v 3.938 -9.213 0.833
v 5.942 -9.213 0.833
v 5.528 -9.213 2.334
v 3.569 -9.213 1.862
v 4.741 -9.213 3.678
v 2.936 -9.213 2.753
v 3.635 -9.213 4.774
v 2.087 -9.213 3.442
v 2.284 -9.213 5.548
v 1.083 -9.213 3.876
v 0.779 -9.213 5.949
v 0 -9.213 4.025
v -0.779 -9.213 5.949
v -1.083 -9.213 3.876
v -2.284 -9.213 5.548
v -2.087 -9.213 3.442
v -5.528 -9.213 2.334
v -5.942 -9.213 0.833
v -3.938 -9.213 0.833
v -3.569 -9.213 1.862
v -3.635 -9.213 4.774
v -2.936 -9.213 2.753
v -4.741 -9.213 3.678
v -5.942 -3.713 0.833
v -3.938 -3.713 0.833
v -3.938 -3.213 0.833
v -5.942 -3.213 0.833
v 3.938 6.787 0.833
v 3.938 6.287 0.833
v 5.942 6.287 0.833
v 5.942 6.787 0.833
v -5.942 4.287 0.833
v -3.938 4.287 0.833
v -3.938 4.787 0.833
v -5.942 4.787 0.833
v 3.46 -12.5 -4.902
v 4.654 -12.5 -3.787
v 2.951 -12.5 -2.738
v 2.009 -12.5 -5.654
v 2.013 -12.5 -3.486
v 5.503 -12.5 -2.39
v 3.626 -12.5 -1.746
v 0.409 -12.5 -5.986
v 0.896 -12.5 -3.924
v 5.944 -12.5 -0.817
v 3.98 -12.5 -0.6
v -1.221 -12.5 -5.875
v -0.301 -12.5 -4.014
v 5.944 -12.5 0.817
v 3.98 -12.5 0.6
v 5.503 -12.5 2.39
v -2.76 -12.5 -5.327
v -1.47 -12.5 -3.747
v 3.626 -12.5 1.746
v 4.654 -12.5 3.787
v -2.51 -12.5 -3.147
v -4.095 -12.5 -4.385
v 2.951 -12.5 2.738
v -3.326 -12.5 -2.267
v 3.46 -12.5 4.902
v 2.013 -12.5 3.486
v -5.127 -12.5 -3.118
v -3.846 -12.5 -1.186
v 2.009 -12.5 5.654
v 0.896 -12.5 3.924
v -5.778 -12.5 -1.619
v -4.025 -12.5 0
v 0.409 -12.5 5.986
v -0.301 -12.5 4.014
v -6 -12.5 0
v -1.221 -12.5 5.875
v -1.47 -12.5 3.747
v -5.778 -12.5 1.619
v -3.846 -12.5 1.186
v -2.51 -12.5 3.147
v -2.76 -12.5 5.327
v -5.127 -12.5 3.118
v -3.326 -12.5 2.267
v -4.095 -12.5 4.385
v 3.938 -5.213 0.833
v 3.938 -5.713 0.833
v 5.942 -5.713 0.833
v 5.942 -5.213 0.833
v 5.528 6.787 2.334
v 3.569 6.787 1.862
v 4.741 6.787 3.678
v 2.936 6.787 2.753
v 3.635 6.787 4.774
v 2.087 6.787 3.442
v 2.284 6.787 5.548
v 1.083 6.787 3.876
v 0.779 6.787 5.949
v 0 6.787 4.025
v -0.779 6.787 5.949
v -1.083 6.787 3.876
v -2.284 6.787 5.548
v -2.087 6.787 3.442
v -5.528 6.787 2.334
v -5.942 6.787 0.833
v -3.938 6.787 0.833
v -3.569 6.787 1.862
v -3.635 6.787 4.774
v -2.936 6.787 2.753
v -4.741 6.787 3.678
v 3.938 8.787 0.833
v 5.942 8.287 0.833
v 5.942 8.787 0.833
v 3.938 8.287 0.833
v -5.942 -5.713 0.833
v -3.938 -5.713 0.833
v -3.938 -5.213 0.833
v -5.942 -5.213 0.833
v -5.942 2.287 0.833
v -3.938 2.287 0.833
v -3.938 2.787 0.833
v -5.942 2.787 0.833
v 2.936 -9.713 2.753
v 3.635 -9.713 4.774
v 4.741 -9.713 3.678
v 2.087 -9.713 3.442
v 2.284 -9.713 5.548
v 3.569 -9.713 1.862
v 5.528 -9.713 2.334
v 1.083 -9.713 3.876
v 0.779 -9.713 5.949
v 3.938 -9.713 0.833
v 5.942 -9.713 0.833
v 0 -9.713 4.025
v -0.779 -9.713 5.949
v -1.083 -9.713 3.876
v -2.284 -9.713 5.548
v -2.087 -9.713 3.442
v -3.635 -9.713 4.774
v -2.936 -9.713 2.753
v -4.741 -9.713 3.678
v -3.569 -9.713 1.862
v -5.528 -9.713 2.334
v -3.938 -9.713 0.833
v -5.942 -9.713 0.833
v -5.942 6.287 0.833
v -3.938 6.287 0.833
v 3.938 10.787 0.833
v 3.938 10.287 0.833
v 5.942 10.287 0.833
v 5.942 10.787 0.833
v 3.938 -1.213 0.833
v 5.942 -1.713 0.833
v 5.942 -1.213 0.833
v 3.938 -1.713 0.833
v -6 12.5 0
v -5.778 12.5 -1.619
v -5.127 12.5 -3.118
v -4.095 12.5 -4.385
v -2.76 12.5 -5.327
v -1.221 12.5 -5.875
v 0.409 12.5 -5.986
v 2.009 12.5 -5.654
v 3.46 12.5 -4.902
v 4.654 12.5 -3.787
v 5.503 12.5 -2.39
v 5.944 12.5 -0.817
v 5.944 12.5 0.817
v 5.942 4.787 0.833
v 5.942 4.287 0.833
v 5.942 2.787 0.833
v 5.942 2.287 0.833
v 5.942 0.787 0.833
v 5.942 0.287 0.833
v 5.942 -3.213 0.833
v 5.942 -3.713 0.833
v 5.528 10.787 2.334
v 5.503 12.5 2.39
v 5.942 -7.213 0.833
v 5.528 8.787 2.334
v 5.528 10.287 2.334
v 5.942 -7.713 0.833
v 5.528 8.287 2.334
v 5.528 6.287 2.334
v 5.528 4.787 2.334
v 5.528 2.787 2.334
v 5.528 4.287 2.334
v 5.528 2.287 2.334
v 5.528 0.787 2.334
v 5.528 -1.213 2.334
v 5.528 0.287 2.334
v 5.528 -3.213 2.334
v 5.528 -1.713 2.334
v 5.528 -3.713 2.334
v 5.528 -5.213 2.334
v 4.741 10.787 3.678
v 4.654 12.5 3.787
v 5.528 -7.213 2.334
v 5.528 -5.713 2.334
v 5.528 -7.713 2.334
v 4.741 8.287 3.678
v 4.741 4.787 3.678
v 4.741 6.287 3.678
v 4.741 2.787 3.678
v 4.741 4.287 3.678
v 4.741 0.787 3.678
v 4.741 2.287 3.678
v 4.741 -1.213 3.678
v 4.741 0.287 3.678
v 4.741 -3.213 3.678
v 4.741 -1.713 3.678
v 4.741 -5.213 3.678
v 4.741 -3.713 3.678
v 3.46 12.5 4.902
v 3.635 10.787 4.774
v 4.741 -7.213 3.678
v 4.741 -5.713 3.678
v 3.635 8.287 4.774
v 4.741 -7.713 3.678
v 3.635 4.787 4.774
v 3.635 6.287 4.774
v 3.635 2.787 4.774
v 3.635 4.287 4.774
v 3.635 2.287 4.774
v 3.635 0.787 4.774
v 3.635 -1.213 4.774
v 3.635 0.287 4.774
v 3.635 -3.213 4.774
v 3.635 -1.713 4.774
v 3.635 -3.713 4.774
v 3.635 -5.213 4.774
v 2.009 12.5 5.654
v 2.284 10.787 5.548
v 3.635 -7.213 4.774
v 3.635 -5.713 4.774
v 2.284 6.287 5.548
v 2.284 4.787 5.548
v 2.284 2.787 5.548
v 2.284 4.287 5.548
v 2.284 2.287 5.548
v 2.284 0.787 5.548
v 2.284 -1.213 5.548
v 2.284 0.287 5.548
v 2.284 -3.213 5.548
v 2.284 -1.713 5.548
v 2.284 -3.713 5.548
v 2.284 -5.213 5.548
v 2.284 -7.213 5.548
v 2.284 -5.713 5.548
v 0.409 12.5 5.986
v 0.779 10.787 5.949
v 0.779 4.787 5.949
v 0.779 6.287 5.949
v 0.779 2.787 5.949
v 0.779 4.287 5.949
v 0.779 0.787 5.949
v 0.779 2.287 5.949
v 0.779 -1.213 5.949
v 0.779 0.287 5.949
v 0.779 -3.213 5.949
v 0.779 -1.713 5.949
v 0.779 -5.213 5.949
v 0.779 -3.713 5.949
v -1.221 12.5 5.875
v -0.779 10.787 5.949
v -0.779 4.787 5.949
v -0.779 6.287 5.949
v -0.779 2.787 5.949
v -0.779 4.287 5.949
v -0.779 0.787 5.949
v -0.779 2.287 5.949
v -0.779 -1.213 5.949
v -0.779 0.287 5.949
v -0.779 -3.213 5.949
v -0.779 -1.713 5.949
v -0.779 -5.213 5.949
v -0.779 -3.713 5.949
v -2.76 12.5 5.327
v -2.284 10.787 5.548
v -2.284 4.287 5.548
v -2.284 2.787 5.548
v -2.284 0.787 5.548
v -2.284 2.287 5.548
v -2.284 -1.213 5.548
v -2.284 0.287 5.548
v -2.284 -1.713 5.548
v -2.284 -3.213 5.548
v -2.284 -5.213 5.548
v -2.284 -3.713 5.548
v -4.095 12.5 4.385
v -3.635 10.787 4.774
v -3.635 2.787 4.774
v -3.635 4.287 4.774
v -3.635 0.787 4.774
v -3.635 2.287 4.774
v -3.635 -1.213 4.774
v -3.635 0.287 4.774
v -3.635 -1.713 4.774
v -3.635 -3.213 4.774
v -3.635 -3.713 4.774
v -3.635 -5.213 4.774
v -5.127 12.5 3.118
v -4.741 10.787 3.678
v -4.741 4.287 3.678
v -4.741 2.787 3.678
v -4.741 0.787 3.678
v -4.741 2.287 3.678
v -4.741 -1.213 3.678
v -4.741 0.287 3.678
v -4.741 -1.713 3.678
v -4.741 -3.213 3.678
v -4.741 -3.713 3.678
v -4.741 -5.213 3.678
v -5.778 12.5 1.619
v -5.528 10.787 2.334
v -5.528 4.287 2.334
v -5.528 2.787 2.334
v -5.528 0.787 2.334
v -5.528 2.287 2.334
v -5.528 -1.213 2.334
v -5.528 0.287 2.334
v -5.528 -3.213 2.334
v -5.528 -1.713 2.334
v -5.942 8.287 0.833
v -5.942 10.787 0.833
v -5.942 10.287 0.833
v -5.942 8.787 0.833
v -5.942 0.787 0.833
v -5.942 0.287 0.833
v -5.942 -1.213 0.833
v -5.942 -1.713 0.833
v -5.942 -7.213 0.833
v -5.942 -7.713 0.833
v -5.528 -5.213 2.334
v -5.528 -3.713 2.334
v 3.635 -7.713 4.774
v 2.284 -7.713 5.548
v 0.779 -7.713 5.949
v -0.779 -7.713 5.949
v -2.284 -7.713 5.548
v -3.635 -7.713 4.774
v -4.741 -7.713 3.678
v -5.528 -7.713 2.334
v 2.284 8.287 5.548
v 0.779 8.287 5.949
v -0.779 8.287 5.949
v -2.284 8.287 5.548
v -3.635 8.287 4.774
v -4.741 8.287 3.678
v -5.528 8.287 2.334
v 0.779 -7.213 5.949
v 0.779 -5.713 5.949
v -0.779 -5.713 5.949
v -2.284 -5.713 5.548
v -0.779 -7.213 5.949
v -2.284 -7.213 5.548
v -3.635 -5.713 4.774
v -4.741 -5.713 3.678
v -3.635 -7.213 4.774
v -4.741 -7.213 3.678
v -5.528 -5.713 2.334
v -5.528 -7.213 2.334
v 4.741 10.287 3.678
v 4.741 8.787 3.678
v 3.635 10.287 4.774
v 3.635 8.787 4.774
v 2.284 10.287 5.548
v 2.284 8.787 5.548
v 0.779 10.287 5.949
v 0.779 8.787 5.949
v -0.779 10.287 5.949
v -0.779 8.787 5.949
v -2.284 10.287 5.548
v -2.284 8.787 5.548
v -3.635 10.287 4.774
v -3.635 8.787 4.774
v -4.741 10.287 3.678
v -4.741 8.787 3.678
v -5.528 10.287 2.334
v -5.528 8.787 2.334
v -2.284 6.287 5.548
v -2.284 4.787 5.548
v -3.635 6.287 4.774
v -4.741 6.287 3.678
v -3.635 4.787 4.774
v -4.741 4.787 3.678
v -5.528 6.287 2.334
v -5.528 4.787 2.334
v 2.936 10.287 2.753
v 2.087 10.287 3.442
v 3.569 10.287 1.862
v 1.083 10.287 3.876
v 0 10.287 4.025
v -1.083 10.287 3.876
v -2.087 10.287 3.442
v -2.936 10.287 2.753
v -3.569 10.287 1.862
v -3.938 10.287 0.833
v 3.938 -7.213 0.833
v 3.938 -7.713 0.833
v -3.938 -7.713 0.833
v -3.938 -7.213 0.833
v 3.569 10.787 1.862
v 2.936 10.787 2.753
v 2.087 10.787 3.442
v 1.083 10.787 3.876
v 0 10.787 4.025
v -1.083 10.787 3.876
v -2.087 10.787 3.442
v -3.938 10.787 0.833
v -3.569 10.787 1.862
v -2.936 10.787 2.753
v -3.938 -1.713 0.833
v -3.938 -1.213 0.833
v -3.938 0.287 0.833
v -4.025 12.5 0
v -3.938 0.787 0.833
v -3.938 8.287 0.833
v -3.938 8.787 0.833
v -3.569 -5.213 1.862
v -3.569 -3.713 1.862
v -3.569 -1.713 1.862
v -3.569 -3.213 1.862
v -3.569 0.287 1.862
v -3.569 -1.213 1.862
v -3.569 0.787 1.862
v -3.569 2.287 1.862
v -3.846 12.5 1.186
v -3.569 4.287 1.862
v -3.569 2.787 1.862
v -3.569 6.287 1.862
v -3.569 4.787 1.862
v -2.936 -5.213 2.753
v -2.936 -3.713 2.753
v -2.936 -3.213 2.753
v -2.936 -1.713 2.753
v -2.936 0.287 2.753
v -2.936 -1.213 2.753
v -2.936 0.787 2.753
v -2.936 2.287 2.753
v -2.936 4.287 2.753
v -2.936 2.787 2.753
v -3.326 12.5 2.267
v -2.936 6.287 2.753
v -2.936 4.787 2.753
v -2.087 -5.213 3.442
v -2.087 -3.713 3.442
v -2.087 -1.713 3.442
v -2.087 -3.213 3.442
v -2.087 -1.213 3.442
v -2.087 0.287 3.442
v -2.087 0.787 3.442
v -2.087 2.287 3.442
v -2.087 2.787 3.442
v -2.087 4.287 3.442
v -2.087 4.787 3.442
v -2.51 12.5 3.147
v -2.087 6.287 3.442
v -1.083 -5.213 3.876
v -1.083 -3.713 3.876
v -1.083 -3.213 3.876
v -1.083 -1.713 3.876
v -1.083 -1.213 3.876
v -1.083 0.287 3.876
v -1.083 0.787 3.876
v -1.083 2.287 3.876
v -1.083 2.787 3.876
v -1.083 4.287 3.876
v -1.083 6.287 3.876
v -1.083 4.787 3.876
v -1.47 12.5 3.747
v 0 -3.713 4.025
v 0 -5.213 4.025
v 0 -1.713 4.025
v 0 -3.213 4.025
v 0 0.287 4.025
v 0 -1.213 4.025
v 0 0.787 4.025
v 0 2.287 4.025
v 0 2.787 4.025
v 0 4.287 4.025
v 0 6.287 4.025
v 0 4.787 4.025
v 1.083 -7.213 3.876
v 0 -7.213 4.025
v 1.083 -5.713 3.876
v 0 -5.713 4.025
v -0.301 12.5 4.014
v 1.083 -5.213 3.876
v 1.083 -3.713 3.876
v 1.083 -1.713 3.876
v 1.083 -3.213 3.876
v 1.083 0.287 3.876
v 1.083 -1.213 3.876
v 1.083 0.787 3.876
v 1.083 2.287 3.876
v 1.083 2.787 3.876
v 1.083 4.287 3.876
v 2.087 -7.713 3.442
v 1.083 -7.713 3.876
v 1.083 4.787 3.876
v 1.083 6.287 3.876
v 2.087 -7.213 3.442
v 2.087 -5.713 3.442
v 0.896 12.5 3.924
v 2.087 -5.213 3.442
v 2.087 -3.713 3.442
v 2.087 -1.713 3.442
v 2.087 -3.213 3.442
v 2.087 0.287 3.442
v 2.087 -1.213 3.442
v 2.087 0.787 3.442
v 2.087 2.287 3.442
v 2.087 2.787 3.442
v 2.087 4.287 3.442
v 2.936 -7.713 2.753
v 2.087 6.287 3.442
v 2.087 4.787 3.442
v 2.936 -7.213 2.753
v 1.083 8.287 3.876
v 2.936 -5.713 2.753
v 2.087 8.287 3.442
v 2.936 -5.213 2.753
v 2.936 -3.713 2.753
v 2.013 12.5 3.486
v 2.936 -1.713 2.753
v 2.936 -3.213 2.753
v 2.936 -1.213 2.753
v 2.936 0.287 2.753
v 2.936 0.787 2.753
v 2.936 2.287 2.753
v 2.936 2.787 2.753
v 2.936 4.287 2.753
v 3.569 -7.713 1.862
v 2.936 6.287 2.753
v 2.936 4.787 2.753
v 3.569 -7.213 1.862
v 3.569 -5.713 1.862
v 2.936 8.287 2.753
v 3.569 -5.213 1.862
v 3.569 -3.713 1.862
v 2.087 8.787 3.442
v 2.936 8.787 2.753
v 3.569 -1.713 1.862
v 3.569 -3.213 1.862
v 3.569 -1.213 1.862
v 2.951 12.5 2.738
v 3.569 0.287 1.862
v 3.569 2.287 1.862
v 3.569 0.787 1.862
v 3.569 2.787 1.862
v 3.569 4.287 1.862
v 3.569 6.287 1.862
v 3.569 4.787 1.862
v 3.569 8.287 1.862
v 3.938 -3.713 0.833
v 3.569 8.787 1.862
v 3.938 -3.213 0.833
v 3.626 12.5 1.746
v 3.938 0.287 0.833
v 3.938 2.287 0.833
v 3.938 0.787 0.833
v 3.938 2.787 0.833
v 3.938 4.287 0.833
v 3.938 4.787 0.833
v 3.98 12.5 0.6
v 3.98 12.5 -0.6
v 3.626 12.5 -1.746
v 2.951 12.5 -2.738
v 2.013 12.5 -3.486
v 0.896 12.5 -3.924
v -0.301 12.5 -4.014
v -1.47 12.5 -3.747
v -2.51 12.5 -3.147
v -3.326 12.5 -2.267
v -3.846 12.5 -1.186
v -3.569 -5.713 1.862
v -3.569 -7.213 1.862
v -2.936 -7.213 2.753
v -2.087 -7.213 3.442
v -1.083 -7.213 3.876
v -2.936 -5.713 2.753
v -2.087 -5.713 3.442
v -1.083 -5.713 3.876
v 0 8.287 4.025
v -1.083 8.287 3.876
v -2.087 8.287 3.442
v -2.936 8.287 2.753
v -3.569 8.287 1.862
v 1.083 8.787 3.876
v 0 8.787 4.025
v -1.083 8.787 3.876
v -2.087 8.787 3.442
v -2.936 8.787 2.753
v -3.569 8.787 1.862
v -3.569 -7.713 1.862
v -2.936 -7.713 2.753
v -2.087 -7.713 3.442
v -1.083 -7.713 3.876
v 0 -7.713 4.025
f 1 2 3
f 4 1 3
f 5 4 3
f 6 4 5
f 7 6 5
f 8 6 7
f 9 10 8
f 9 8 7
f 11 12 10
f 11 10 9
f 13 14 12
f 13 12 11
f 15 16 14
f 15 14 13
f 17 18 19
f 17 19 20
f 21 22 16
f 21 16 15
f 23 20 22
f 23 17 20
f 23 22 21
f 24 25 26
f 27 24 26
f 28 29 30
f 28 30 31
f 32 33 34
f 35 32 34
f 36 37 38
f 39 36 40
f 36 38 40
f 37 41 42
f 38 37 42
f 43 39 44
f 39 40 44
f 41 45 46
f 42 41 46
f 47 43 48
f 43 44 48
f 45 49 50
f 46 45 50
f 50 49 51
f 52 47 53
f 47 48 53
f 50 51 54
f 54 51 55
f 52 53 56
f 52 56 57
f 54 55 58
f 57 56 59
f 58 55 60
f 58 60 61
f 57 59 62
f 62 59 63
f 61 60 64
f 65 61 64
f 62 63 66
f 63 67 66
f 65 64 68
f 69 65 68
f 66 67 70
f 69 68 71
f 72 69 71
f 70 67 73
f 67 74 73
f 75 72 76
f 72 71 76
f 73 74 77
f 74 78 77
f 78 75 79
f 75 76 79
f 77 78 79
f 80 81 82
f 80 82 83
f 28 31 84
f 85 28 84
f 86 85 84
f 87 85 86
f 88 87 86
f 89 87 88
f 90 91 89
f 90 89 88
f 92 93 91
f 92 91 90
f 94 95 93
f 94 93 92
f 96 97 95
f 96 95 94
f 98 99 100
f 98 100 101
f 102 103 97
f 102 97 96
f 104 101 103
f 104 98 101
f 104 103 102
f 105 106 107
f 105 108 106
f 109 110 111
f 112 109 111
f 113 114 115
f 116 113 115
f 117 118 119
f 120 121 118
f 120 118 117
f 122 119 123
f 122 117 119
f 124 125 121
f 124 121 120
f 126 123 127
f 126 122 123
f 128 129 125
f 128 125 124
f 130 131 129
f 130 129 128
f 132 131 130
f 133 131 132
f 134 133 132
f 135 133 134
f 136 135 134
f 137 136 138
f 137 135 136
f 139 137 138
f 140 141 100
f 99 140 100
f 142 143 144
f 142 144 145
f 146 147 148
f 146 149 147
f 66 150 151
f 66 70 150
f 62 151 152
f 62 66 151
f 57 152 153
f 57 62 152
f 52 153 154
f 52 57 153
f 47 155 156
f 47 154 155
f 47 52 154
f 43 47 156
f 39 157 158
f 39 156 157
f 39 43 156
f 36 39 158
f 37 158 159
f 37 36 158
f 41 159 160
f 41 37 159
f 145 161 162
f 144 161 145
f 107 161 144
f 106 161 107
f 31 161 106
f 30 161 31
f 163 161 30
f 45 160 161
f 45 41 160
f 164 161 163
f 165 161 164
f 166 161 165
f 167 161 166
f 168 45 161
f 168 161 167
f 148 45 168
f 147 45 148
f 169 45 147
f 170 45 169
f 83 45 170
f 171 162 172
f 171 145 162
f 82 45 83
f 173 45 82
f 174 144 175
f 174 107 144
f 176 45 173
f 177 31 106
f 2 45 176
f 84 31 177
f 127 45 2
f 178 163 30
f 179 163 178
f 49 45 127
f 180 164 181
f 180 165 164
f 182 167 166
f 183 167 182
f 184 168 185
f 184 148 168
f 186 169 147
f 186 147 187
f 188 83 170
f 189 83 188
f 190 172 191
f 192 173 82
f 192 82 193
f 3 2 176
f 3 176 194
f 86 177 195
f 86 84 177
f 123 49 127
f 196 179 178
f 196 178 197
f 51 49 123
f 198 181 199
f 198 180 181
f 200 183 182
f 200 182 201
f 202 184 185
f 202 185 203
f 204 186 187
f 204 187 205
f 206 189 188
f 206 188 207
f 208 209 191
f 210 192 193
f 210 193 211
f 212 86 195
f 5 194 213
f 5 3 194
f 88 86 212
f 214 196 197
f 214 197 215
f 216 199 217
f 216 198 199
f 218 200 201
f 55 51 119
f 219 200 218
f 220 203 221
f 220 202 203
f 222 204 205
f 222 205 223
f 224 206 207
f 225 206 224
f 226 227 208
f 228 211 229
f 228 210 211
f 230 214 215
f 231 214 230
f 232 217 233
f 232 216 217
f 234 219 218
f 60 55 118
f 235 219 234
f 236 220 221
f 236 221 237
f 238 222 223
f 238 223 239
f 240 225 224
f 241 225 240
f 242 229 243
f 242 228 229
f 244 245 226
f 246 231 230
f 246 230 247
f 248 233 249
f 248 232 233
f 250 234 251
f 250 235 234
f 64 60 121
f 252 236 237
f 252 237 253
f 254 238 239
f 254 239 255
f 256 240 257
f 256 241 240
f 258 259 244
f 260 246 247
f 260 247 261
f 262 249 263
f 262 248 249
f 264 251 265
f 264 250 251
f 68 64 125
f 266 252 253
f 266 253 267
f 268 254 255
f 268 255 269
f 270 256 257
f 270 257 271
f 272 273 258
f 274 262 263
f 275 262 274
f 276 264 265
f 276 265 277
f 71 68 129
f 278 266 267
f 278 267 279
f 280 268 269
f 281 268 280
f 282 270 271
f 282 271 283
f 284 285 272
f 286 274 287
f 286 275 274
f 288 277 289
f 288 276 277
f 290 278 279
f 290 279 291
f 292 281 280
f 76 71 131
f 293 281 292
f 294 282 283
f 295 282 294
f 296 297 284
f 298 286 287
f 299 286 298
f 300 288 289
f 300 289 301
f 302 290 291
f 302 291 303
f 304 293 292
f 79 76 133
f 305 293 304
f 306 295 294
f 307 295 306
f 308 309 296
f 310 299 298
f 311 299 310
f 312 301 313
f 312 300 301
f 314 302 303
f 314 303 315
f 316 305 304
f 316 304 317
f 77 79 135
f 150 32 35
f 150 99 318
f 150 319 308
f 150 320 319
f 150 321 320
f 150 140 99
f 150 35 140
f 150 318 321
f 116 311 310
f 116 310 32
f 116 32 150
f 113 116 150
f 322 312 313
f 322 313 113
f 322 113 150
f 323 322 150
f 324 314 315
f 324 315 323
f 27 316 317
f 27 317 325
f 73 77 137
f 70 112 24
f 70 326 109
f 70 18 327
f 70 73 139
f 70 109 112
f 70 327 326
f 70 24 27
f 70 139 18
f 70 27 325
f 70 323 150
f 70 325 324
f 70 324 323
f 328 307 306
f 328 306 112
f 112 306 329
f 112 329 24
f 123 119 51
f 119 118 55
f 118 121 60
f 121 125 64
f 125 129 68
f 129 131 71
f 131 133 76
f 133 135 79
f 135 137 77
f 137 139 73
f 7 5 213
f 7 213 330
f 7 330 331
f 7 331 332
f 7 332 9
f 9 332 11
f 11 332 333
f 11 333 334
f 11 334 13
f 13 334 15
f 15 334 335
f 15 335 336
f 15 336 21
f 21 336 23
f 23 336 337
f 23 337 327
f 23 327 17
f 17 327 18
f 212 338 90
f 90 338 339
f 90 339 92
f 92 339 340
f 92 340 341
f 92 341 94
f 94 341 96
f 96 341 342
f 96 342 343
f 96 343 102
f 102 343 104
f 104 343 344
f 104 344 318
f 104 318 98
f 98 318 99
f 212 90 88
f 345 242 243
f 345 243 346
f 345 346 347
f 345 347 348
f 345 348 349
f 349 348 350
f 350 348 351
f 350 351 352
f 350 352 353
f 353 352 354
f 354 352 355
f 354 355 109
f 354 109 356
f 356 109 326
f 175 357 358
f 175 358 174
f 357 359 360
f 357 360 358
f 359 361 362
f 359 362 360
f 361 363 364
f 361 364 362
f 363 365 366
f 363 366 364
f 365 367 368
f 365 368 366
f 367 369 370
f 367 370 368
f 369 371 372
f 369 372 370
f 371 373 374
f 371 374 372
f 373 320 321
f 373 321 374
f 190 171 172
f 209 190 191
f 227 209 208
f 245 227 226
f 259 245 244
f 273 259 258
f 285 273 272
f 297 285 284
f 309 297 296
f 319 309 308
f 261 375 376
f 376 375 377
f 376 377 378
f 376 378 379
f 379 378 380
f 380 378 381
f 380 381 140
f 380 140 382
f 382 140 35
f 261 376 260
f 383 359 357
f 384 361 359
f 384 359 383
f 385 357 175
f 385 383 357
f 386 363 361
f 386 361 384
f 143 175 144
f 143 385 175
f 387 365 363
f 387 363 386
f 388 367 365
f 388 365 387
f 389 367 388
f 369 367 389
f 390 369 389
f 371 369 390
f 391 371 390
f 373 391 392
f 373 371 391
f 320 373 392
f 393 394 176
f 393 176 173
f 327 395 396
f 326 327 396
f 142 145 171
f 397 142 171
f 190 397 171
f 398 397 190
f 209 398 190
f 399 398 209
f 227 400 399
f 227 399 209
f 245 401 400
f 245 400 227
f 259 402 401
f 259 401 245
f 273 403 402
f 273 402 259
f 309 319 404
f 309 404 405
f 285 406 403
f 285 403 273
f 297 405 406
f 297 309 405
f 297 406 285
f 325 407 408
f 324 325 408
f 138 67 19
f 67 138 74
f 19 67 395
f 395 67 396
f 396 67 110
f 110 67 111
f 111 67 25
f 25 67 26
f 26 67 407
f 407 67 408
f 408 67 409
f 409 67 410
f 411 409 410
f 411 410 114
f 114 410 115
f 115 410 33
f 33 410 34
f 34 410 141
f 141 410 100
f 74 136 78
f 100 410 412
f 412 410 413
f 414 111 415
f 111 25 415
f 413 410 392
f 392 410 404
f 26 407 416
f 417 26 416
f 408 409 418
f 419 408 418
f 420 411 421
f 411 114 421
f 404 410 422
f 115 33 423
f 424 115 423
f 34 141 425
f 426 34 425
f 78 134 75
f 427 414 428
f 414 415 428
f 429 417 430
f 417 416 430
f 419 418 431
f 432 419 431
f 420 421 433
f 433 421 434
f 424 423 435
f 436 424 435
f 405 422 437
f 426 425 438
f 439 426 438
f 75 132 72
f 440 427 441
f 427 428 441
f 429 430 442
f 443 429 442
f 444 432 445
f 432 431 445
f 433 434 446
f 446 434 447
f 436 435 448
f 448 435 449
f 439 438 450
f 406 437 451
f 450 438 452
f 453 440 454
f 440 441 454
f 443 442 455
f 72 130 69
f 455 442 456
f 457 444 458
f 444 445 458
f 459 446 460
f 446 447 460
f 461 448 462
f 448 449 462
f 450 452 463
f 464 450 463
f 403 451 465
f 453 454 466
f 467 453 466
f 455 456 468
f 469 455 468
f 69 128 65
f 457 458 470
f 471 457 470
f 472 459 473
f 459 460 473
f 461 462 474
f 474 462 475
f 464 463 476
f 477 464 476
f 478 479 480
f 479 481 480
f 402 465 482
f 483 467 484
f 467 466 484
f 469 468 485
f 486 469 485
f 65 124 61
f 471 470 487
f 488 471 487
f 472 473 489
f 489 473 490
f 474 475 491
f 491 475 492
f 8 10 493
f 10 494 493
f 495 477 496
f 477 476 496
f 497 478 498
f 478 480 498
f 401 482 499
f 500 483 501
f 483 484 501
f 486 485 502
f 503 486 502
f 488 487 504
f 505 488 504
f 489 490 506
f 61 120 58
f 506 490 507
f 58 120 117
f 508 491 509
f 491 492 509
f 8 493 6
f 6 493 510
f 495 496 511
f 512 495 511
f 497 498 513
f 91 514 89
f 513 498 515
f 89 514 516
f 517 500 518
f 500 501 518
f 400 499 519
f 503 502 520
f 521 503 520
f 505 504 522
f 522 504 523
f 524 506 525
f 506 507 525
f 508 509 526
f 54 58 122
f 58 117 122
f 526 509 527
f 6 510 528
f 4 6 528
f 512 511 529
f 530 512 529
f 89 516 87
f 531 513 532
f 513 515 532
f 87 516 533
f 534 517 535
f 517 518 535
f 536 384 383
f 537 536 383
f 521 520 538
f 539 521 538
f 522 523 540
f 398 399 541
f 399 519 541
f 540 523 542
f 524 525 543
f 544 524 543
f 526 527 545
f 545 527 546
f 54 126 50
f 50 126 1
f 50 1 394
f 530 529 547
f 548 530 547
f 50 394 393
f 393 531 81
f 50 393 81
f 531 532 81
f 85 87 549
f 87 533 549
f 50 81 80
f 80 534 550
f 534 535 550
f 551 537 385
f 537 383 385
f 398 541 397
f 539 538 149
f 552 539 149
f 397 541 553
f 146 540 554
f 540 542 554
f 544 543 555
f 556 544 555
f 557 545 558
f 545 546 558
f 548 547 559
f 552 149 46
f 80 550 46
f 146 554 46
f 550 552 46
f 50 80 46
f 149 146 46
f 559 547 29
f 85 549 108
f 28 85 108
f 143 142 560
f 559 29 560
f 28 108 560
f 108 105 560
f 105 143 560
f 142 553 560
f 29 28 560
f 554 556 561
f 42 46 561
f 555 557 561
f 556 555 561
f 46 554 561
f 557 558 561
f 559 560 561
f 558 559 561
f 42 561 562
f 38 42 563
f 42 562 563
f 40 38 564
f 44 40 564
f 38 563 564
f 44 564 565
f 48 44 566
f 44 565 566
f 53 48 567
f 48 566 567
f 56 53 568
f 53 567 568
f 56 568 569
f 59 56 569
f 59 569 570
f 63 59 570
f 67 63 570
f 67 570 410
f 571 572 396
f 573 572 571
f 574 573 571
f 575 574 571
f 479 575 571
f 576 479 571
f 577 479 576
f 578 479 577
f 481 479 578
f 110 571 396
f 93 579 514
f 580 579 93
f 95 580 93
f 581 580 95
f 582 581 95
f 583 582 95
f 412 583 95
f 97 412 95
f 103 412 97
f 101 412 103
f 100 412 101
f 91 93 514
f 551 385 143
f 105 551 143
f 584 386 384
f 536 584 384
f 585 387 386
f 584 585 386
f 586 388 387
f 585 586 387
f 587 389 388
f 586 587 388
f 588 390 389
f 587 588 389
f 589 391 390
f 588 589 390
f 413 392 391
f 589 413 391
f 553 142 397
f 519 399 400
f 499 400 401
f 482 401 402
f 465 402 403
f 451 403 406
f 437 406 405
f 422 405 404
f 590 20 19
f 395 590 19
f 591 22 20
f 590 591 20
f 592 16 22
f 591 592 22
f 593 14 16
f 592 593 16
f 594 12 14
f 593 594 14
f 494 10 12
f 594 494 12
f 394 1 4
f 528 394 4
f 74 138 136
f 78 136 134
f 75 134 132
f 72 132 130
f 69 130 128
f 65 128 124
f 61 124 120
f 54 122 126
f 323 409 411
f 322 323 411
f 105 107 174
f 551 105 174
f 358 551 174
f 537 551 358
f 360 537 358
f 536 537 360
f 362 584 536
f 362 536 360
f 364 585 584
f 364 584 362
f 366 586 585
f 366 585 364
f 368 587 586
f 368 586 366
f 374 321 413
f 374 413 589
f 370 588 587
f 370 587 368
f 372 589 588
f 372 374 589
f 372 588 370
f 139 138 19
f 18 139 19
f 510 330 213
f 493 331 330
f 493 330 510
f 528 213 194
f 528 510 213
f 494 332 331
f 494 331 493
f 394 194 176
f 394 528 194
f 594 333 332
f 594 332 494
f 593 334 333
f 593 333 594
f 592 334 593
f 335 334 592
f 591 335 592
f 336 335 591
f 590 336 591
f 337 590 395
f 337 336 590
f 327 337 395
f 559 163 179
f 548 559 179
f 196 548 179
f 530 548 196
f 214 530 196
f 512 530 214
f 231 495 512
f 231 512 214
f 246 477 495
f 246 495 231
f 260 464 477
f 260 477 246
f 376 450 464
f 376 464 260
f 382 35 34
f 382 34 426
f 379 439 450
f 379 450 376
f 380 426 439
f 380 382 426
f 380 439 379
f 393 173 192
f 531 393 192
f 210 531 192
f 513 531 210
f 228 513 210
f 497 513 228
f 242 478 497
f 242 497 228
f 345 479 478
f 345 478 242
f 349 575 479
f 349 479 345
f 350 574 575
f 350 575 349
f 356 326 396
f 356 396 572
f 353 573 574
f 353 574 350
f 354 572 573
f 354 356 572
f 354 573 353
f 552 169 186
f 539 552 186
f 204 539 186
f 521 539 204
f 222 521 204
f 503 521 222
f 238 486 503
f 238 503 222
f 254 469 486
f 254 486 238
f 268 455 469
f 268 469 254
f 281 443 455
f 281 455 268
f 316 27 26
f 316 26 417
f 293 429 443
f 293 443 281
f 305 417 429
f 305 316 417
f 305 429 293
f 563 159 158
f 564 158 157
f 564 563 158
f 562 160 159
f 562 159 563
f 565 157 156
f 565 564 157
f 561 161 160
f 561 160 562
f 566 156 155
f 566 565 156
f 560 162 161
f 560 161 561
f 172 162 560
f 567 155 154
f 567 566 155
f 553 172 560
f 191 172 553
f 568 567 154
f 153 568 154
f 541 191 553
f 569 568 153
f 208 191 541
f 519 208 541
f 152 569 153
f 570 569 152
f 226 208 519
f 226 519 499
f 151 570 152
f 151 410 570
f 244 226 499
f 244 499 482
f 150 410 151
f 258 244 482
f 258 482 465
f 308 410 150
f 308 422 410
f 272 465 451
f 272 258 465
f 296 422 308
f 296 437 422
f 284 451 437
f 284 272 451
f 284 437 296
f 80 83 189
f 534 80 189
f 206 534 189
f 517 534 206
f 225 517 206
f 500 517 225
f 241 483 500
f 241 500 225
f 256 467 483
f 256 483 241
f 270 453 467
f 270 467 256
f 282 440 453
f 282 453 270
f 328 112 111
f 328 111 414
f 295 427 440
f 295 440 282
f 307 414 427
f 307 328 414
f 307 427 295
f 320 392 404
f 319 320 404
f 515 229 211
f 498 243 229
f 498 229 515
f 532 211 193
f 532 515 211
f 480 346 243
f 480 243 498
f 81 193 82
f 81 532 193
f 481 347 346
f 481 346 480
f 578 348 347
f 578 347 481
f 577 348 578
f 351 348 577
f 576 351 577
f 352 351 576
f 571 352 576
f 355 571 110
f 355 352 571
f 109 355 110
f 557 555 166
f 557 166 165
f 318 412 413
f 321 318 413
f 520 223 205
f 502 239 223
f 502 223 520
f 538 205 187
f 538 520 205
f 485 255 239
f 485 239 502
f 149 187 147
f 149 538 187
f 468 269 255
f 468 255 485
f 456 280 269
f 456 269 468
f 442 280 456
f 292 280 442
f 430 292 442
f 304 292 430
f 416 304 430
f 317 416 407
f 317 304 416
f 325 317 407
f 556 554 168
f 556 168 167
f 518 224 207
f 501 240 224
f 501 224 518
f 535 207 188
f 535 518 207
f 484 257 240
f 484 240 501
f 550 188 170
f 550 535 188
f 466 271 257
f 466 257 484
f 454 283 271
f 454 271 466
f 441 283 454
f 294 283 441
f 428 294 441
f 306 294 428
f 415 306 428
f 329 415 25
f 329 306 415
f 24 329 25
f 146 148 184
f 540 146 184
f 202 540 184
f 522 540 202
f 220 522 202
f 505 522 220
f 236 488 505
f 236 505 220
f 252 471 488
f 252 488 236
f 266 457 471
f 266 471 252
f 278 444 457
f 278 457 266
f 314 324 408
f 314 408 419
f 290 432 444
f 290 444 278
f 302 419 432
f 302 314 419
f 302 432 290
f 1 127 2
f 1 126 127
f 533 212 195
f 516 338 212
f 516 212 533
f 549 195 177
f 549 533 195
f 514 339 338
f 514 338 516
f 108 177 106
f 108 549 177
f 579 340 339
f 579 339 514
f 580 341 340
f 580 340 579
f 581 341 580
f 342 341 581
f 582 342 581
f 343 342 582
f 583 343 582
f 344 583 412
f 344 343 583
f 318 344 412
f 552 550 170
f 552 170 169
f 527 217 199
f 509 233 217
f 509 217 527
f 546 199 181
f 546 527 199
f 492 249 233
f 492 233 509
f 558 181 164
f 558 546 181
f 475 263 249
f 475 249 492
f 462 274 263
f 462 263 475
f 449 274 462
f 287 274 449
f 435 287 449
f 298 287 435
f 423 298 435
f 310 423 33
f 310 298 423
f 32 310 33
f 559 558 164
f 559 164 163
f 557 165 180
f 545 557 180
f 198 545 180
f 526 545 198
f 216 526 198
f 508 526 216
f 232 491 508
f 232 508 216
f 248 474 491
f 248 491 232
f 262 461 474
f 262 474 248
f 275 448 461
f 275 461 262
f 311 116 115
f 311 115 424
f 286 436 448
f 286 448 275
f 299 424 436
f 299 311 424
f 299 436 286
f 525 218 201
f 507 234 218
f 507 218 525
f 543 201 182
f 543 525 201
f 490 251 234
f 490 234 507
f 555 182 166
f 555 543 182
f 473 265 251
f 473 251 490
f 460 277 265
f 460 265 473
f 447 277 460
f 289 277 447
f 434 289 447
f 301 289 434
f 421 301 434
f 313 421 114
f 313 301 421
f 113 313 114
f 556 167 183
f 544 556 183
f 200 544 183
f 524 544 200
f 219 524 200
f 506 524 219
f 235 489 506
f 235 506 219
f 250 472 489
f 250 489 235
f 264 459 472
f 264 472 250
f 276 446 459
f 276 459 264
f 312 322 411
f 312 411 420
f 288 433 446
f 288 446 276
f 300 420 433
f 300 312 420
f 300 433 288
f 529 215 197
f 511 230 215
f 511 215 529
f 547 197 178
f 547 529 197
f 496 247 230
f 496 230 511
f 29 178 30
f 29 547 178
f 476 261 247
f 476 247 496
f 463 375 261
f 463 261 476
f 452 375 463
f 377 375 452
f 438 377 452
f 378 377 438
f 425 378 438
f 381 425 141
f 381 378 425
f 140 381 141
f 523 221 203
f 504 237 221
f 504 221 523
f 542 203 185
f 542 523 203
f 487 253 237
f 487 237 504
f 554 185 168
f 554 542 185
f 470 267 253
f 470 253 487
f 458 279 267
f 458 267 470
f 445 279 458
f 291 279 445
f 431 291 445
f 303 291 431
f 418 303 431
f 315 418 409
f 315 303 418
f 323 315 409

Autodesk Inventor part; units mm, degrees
ref_plane "YZ Plane" through (0, 0, 0) normal (1, 0, 0) x (0, 1, 0)
ref_plane "XZ Plane" through (0, 0, 0) normal (0, 1, 0) x (-1, 0, 0)
ref_plane "XY Plane" through (0, 0, 0) normal (0, 0, 1) x (1, 0, 0)
sketch "Boceto1" plane through (0, 0, 0) normal (0, 1, 0) x (-1, 0, 0)
  circle A0 centre (0, 0) radius 4.025
  circle A1 centre (0, 0) radius 6
  dimension "d0" = 8.05
  dimension "d1" = 12
extrude "Extrusión1" add sketch "Boceto1" along normal mid plane 25
sketch "Boceto2" plane through (0, 0, 0) normal (1, 0, 0) x (0, 1, 0)
  line L0 (10.7872, 7.1236) -> (10.2872, 7.1236)
  line L1 (10.2872, 7.1236) -> (10.2872, 0.8326)
  line L2 (10.2872, 0.8326) -> (10.7872, 0.8326)
  line L3 (10.7872, 0.8326) -> (10.7872, 7.1236)
  point P0 (0, 0)
  dimension "d4" = 0.5
extrude "Extrusión2" cut sketch "Boceto2" along normal mid plane 25
pattern_linear "Patrón rectangular1" count 11 spacing 2 along (0, -1, 0) of "Extrusión2"
properties part number "unión"
